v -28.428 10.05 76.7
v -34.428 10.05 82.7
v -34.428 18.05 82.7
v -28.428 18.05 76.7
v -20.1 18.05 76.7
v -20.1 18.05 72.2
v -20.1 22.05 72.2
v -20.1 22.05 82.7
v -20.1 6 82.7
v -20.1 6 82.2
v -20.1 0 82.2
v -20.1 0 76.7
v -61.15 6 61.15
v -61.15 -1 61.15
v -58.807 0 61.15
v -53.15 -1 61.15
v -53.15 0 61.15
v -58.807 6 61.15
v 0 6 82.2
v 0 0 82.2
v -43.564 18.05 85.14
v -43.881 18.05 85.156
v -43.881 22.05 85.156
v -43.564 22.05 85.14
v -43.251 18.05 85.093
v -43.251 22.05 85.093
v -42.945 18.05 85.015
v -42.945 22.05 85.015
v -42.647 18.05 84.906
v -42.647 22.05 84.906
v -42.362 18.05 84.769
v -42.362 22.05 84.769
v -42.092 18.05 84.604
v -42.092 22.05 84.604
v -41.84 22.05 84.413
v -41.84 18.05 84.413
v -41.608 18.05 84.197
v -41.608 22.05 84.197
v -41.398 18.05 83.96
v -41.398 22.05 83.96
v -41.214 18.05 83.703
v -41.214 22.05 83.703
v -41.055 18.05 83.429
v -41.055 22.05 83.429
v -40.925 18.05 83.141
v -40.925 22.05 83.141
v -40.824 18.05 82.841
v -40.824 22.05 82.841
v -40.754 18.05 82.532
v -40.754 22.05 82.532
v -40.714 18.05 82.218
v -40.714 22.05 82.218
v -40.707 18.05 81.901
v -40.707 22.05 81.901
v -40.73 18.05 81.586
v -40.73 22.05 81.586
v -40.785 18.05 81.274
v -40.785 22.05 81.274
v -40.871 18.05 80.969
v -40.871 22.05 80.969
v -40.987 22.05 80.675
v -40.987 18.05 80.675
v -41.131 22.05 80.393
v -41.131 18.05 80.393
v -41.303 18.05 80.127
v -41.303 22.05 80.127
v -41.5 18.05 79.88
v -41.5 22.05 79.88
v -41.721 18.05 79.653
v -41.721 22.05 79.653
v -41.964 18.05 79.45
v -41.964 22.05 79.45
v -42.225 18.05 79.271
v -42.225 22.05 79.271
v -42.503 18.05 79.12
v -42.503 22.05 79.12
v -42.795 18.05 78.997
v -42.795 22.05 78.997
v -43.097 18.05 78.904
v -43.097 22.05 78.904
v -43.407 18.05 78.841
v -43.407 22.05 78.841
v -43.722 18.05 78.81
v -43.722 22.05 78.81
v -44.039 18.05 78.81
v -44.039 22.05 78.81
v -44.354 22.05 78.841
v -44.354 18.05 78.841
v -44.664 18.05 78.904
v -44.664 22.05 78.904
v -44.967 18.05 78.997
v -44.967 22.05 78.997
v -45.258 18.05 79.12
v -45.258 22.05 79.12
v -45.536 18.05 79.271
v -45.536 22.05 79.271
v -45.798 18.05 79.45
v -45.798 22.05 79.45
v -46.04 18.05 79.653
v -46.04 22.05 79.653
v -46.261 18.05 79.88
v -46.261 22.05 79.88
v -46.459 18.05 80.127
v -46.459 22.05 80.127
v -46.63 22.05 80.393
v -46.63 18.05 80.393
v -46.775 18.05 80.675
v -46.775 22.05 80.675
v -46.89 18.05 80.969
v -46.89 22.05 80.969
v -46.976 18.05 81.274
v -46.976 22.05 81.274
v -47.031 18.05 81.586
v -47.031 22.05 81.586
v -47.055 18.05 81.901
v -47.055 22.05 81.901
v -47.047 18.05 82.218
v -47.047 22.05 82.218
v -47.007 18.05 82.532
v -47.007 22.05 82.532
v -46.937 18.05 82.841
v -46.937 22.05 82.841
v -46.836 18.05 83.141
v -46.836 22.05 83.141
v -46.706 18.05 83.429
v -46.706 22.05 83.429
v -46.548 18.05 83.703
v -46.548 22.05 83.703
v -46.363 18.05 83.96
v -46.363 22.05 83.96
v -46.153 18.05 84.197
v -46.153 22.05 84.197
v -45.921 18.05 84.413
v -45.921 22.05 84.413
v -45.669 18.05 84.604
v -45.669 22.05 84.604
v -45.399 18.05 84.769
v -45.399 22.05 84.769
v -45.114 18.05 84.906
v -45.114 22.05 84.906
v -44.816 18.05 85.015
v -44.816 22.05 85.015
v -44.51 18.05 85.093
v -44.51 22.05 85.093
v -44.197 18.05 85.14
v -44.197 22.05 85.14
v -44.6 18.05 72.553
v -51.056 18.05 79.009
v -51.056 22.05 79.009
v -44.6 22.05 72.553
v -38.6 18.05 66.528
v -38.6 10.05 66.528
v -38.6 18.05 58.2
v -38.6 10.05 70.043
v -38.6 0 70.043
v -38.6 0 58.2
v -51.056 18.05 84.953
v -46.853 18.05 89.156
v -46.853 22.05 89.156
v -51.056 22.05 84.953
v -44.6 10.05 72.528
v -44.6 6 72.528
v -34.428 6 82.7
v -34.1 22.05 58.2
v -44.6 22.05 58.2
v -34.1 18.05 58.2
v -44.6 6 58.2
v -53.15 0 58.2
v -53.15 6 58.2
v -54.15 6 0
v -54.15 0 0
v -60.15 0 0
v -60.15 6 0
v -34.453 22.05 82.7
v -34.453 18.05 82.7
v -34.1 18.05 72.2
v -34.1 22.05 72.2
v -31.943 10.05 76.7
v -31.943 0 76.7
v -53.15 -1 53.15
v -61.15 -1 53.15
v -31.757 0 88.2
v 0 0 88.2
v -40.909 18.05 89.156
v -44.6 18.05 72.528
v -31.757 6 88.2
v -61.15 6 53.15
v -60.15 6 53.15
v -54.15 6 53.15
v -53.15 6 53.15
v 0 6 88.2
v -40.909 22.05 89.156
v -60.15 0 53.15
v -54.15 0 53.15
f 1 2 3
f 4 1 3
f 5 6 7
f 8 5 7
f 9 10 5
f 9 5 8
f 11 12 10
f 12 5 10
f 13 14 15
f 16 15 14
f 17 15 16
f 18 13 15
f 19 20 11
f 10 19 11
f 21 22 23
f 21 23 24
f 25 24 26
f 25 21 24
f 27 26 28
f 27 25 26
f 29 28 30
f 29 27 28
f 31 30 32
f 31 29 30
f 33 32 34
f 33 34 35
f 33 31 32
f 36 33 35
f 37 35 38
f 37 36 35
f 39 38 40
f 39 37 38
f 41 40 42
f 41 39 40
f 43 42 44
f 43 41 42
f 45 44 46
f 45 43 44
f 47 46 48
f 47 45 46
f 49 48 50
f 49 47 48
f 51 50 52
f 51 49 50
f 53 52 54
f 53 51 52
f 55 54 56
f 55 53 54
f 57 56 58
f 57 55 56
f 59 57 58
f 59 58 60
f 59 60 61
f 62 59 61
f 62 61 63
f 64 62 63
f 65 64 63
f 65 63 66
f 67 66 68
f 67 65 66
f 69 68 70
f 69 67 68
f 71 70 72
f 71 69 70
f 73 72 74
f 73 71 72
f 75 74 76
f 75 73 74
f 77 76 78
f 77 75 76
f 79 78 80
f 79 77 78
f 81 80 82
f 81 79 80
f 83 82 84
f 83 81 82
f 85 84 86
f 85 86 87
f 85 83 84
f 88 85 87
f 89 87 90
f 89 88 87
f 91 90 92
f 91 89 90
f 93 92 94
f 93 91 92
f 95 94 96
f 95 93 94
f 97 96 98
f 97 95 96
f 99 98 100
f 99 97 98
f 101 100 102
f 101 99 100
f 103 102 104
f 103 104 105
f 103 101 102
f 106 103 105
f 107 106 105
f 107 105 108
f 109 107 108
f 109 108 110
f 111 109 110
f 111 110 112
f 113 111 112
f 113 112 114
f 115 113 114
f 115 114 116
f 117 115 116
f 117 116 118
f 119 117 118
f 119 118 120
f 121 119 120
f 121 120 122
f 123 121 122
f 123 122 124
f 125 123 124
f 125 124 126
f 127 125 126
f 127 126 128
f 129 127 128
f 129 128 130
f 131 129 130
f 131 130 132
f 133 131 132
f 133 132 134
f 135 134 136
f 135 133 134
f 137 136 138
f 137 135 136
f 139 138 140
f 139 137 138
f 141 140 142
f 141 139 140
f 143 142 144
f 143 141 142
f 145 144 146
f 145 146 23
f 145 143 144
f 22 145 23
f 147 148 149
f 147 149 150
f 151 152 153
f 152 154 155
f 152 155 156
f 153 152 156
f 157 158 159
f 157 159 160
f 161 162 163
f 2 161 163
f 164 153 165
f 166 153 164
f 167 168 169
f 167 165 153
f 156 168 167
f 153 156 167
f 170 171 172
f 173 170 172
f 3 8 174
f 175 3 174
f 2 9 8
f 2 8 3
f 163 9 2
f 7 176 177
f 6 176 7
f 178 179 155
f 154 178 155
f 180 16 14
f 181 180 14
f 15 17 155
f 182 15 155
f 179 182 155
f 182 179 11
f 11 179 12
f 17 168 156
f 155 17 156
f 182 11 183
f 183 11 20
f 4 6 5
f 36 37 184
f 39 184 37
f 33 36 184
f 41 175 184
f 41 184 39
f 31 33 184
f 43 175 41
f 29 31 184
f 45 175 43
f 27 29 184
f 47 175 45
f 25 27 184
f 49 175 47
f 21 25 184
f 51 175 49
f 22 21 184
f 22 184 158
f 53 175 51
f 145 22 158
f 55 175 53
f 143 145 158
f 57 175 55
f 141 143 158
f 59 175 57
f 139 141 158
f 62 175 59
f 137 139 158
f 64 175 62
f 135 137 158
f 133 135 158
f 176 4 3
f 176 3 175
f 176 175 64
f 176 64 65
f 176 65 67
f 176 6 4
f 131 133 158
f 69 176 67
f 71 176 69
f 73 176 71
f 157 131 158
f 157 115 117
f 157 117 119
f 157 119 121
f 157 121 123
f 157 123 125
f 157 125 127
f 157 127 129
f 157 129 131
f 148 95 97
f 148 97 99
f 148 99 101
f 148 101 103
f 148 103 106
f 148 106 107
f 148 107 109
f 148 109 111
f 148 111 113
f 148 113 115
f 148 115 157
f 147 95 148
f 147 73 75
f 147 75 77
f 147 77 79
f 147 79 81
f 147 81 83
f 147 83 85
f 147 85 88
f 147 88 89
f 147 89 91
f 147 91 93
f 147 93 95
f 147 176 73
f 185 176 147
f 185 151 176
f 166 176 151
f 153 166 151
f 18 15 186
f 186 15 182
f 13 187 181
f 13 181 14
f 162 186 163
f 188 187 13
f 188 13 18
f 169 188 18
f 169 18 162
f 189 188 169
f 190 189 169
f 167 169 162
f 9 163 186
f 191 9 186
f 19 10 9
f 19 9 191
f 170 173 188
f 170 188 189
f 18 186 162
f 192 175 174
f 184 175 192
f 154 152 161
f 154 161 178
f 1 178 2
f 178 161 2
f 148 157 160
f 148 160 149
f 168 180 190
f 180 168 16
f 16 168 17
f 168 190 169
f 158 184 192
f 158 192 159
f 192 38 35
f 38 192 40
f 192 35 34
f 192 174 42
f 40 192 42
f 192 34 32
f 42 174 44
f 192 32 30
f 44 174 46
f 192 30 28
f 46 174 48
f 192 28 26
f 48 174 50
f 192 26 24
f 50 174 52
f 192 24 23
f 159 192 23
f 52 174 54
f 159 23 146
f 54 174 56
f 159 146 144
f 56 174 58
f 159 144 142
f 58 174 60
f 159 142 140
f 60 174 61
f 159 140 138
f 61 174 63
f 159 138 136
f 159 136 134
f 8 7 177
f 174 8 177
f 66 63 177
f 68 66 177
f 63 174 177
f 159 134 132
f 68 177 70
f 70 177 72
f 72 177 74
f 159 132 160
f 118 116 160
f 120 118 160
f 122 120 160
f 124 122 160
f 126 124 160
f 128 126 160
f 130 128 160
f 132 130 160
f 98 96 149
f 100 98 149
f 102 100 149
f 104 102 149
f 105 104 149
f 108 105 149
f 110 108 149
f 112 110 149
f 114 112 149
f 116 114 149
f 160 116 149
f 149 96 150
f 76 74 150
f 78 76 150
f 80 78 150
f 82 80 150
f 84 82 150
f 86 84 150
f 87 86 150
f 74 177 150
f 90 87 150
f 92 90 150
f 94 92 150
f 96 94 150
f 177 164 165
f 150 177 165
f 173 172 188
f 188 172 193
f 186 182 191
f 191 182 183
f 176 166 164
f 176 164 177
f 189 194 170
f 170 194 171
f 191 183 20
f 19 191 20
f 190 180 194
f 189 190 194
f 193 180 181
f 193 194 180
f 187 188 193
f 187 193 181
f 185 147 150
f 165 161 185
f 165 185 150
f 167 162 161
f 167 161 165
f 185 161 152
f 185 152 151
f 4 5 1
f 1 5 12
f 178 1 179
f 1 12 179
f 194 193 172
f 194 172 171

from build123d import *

# Parameters (mm, degrees)
BOSS_EXTRUDE1_DEPTH            = 6
BOSS_EXTRUDE2_DEPTH            = 1
BOSS_EXTRUDE3_DEPTH            = 12.05
SKETCH4_R                      = 3.175
BOSS_EXTRUDE4_DEPTH            = 4
CUT_EXTRUDE1_REACH             = 87.707
SKETCH5_W                      = 14.384776311
SKETCH5_H                      = 8
CUT_EXTRUDE1_DIRECTION_2_DEPTH = 86.707273439


with BuildPart() as part:
    # Sketch1 → Boss-Extrude1 (new body)
    with BuildSketch(Plane(origin=(0, 0, 0), x_dir=(1, 0, 0), z_dir=(0, 1, 0))):
        Polygon((-54.15, 0), (-60.15, 0), (-60.15, -53.15), (-61.15, -53.15), (-61.15, -61.15), (-58.806854249, -61.15), (-31.756854249, -88.2), (0, -88.2), (0, -82.2), (-20.1, -82.2), (-20.1, -76.7), (-31.943145751, -76.7), (-38.6, -70.043145751), (-38.6, -58.2), (-53.15, -58.2), (-53.15, -53.15), (-54.15, -53.15), align=None)
    extrude(amount=BOSS_EXTRUDE1_DEPTH)

    # Sketch2 → Boss-Extrude2 (add)
    with BuildSketch(Plane.XZ):
        Polygon((-53.15, 58.2), (-53.15, 53.15), (-61.15, 53.15), (-61.15, 61.15), (-53.15, 61.15), align=None)
    extrude(amount=BOSS_EXTRUDE2_DEPTH)

    # Sketch3 → Boss-Extrude3 (add)
    with BuildSketch(Plane(origin=(0, 6, 0), x_dir=(1, 0, 0), z_dir=(0, 1, 0))):
        Polygon((-38.6, -58.2), (-44.6, -58.2), (-44.6, -72.528427125), (-34.428427125, -82.7), (-20.1, -82.7), (-20.1, -76.7), (-31.943145751, -76.7), (-38.6, -70.043145751), align=None)
    extrude(amount=BOSS_EXTRUDE3_DEPTH)

    # Sketch4 → Boss-Extrude4 (add)
    with BuildSketch(Plane(origin=(0, 18.05, 0), x_dir=(1, 0, 0), z_dir=(0, 1, 0))):
        Polygon((-44.6, -58.2), (-34.1, -58.2), (-34.1, -72.2), (-20.1, -72.2), (-20.1, -82.7), (-34.45301769, -82.7), (-40.908615626, -89.155597936), (-46.852580246, -89.155597936), (-51.055597936, -84.952580246), (-51.055597936, -79.008615626), (-44.6, -72.55301769), align=None)
        with Locations(Location((-43.880597936, -81.980597936, 0), (0, 0, 270))):
            Circle(SKETCH4_R, mode=Mode.SUBTRACT)
    extrude(amount=BOSS_EXTRUDE4_DEPTH)

    # Sketch5 → Cut-Extrude1 (cut, up to next)
    with BuildSketch(Plane(origin=(-58.564213562, 0, 58.564213562), x_dir=(0.7071067811865475, 0, 0.7071067811865477), z_dir=(-0.7071067811865477, 0, 0.7071067811865475)), mode=Mode.PRIVATE) as cut_extrude1_sk1:
        with Locations((26.940768364, 14.05)):
            Rectangle(SKETCH5_W, SKETCH5_H)
    cut_extrude1_tool1 = extrude(cut_extrude1_sk1.sketch, amount=-CUT_EXTRUDE1_REACH, mode=Mode.PRIVATE) & part.part
    add(cut_extrude1_tool1.solids().sort_by_distance((-39.514214, 14.05, 77.614214))[0], mode=Mode.SUBTRACT)

    # Sketch5 → Cut-Extrude1 direction 2 (cut)
    with BuildSketch(Plane(origin=(-58.564213562, 0, 58.564213562), x_dir=(0.7071067811865475, 0, 0.7071067811865477), z_dir=(-0.7071067811865477, 0, 0.7071067811865475))):
        with Locations((26.940768364, 14.05)):
            Rectangle(SKETCH5_W, SKETCH5_H)
    extrude(amount=CUT_EXTRUDE1_DIRECTION_2_DEPTH, mode=Mode.SUBTRACT)


solid = part.part
